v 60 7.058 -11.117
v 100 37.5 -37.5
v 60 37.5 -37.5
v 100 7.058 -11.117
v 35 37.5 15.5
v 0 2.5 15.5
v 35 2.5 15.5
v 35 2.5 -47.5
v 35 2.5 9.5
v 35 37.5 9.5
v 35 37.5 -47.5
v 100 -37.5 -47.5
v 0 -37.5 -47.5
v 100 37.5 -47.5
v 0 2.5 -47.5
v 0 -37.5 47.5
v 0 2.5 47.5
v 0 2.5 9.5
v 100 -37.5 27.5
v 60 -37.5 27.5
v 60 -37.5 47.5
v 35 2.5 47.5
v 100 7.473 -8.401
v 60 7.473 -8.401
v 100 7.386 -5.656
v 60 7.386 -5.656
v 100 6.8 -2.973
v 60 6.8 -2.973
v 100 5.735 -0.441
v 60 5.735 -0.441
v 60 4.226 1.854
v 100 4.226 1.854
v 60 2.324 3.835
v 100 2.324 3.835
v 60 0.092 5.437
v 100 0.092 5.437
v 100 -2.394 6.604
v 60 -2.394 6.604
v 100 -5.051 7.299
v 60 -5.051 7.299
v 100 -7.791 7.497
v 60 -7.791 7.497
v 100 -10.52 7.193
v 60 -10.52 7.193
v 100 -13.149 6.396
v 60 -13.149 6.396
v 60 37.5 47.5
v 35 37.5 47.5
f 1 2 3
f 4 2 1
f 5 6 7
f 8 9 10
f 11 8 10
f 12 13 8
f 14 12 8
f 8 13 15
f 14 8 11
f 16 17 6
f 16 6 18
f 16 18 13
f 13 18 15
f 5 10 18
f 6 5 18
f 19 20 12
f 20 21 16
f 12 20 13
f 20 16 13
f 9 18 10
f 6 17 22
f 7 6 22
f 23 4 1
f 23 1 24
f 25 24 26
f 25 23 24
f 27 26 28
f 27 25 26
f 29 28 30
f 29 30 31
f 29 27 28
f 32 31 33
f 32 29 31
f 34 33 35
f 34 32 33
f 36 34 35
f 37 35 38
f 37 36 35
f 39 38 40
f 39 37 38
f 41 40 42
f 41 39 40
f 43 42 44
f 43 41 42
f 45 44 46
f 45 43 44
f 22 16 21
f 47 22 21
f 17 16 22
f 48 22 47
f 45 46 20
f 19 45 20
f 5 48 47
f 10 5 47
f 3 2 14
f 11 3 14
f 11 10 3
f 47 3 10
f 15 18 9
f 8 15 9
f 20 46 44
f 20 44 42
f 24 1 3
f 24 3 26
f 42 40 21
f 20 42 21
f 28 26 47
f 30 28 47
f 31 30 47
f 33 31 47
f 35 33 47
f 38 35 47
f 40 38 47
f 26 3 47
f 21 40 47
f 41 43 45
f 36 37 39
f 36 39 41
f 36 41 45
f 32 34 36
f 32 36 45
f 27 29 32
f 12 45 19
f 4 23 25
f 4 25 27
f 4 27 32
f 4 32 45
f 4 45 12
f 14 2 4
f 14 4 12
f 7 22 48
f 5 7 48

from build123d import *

# Parameters (mm, degrees)
SKETCH1_W           = 95
SKETCH1_H           = 75
BOSS_EXTRUDE1_DEPTH = 100
CUT_EXTRUDE1_DEPTH  = 40
SKETCH4_W           = 35
SKETCH4_H           = 35
CUT_EXTRUDE2_DEPTH  = 96
BOSS_EXTRUDE4_DEPTH = 6


with BuildPart() as part:
    # Sketch1 → Boss-Extrude1 (new body)
    with BuildSketch(Plane(origin=(0, 0, 0), x_dir=(0, 0, -1), z_dir=(1, 0, 0))):
        Rectangle(SKETCH1_W, SKETCH1_H)
    extrude(amount=BOSS_EXTRUDE1_DEPTH)

    # Sketch2 → Cut-Extrude1 (cut)
    with BuildSketch(Plane(origin=(100, 0, 0), x_dir=(0, 0, -1), z_dir=(1, 0, 0))):
        with BuildLine():
            Line((37.5, 37.5), (11.116502976, 7.057503434))
            ThreePointArc((11.116502976, 7.057503434), (-3.835336242, 2.323958076), (-6.395690793, -13.148873992))
            Line((-6.395690793, -13.148873992), (-27.5, -37.5))
            Line((-27.5, -37.5), (-47.5, -37.5))
            Line((-47.5, -37.5), (-47.5, 37.5))
            Line((-47.5, 37.5), (37.5, 37.5))
        make_face()
    extrude(amount=-CUT_EXTRUDE1_DEPTH, mode=Mode.SUBTRACT)

    # Sketch4 → Cut-Extrude2 (cut, through all)
    with BuildSketch(Plane.XY.offset(47.5)):
        with Locations((17.5, 20)):
            Rectangle(SKETCH4_W, SKETCH4_H)
    extrude(amount=-CUT_EXTRUDE2_DEPTH, mode=Mode.SUBTRACT)

    # Sketch14 → Boss-Extrude4 (add)
    with BuildSketch(Plane.XY.offset(9.5)):
        Polygon((35, 37.5), (0, 2.5), (35, 2.5), align=None)
    extrude(amount=BOSS_EXTRUDE4_DEPTH)


solid = part.part
